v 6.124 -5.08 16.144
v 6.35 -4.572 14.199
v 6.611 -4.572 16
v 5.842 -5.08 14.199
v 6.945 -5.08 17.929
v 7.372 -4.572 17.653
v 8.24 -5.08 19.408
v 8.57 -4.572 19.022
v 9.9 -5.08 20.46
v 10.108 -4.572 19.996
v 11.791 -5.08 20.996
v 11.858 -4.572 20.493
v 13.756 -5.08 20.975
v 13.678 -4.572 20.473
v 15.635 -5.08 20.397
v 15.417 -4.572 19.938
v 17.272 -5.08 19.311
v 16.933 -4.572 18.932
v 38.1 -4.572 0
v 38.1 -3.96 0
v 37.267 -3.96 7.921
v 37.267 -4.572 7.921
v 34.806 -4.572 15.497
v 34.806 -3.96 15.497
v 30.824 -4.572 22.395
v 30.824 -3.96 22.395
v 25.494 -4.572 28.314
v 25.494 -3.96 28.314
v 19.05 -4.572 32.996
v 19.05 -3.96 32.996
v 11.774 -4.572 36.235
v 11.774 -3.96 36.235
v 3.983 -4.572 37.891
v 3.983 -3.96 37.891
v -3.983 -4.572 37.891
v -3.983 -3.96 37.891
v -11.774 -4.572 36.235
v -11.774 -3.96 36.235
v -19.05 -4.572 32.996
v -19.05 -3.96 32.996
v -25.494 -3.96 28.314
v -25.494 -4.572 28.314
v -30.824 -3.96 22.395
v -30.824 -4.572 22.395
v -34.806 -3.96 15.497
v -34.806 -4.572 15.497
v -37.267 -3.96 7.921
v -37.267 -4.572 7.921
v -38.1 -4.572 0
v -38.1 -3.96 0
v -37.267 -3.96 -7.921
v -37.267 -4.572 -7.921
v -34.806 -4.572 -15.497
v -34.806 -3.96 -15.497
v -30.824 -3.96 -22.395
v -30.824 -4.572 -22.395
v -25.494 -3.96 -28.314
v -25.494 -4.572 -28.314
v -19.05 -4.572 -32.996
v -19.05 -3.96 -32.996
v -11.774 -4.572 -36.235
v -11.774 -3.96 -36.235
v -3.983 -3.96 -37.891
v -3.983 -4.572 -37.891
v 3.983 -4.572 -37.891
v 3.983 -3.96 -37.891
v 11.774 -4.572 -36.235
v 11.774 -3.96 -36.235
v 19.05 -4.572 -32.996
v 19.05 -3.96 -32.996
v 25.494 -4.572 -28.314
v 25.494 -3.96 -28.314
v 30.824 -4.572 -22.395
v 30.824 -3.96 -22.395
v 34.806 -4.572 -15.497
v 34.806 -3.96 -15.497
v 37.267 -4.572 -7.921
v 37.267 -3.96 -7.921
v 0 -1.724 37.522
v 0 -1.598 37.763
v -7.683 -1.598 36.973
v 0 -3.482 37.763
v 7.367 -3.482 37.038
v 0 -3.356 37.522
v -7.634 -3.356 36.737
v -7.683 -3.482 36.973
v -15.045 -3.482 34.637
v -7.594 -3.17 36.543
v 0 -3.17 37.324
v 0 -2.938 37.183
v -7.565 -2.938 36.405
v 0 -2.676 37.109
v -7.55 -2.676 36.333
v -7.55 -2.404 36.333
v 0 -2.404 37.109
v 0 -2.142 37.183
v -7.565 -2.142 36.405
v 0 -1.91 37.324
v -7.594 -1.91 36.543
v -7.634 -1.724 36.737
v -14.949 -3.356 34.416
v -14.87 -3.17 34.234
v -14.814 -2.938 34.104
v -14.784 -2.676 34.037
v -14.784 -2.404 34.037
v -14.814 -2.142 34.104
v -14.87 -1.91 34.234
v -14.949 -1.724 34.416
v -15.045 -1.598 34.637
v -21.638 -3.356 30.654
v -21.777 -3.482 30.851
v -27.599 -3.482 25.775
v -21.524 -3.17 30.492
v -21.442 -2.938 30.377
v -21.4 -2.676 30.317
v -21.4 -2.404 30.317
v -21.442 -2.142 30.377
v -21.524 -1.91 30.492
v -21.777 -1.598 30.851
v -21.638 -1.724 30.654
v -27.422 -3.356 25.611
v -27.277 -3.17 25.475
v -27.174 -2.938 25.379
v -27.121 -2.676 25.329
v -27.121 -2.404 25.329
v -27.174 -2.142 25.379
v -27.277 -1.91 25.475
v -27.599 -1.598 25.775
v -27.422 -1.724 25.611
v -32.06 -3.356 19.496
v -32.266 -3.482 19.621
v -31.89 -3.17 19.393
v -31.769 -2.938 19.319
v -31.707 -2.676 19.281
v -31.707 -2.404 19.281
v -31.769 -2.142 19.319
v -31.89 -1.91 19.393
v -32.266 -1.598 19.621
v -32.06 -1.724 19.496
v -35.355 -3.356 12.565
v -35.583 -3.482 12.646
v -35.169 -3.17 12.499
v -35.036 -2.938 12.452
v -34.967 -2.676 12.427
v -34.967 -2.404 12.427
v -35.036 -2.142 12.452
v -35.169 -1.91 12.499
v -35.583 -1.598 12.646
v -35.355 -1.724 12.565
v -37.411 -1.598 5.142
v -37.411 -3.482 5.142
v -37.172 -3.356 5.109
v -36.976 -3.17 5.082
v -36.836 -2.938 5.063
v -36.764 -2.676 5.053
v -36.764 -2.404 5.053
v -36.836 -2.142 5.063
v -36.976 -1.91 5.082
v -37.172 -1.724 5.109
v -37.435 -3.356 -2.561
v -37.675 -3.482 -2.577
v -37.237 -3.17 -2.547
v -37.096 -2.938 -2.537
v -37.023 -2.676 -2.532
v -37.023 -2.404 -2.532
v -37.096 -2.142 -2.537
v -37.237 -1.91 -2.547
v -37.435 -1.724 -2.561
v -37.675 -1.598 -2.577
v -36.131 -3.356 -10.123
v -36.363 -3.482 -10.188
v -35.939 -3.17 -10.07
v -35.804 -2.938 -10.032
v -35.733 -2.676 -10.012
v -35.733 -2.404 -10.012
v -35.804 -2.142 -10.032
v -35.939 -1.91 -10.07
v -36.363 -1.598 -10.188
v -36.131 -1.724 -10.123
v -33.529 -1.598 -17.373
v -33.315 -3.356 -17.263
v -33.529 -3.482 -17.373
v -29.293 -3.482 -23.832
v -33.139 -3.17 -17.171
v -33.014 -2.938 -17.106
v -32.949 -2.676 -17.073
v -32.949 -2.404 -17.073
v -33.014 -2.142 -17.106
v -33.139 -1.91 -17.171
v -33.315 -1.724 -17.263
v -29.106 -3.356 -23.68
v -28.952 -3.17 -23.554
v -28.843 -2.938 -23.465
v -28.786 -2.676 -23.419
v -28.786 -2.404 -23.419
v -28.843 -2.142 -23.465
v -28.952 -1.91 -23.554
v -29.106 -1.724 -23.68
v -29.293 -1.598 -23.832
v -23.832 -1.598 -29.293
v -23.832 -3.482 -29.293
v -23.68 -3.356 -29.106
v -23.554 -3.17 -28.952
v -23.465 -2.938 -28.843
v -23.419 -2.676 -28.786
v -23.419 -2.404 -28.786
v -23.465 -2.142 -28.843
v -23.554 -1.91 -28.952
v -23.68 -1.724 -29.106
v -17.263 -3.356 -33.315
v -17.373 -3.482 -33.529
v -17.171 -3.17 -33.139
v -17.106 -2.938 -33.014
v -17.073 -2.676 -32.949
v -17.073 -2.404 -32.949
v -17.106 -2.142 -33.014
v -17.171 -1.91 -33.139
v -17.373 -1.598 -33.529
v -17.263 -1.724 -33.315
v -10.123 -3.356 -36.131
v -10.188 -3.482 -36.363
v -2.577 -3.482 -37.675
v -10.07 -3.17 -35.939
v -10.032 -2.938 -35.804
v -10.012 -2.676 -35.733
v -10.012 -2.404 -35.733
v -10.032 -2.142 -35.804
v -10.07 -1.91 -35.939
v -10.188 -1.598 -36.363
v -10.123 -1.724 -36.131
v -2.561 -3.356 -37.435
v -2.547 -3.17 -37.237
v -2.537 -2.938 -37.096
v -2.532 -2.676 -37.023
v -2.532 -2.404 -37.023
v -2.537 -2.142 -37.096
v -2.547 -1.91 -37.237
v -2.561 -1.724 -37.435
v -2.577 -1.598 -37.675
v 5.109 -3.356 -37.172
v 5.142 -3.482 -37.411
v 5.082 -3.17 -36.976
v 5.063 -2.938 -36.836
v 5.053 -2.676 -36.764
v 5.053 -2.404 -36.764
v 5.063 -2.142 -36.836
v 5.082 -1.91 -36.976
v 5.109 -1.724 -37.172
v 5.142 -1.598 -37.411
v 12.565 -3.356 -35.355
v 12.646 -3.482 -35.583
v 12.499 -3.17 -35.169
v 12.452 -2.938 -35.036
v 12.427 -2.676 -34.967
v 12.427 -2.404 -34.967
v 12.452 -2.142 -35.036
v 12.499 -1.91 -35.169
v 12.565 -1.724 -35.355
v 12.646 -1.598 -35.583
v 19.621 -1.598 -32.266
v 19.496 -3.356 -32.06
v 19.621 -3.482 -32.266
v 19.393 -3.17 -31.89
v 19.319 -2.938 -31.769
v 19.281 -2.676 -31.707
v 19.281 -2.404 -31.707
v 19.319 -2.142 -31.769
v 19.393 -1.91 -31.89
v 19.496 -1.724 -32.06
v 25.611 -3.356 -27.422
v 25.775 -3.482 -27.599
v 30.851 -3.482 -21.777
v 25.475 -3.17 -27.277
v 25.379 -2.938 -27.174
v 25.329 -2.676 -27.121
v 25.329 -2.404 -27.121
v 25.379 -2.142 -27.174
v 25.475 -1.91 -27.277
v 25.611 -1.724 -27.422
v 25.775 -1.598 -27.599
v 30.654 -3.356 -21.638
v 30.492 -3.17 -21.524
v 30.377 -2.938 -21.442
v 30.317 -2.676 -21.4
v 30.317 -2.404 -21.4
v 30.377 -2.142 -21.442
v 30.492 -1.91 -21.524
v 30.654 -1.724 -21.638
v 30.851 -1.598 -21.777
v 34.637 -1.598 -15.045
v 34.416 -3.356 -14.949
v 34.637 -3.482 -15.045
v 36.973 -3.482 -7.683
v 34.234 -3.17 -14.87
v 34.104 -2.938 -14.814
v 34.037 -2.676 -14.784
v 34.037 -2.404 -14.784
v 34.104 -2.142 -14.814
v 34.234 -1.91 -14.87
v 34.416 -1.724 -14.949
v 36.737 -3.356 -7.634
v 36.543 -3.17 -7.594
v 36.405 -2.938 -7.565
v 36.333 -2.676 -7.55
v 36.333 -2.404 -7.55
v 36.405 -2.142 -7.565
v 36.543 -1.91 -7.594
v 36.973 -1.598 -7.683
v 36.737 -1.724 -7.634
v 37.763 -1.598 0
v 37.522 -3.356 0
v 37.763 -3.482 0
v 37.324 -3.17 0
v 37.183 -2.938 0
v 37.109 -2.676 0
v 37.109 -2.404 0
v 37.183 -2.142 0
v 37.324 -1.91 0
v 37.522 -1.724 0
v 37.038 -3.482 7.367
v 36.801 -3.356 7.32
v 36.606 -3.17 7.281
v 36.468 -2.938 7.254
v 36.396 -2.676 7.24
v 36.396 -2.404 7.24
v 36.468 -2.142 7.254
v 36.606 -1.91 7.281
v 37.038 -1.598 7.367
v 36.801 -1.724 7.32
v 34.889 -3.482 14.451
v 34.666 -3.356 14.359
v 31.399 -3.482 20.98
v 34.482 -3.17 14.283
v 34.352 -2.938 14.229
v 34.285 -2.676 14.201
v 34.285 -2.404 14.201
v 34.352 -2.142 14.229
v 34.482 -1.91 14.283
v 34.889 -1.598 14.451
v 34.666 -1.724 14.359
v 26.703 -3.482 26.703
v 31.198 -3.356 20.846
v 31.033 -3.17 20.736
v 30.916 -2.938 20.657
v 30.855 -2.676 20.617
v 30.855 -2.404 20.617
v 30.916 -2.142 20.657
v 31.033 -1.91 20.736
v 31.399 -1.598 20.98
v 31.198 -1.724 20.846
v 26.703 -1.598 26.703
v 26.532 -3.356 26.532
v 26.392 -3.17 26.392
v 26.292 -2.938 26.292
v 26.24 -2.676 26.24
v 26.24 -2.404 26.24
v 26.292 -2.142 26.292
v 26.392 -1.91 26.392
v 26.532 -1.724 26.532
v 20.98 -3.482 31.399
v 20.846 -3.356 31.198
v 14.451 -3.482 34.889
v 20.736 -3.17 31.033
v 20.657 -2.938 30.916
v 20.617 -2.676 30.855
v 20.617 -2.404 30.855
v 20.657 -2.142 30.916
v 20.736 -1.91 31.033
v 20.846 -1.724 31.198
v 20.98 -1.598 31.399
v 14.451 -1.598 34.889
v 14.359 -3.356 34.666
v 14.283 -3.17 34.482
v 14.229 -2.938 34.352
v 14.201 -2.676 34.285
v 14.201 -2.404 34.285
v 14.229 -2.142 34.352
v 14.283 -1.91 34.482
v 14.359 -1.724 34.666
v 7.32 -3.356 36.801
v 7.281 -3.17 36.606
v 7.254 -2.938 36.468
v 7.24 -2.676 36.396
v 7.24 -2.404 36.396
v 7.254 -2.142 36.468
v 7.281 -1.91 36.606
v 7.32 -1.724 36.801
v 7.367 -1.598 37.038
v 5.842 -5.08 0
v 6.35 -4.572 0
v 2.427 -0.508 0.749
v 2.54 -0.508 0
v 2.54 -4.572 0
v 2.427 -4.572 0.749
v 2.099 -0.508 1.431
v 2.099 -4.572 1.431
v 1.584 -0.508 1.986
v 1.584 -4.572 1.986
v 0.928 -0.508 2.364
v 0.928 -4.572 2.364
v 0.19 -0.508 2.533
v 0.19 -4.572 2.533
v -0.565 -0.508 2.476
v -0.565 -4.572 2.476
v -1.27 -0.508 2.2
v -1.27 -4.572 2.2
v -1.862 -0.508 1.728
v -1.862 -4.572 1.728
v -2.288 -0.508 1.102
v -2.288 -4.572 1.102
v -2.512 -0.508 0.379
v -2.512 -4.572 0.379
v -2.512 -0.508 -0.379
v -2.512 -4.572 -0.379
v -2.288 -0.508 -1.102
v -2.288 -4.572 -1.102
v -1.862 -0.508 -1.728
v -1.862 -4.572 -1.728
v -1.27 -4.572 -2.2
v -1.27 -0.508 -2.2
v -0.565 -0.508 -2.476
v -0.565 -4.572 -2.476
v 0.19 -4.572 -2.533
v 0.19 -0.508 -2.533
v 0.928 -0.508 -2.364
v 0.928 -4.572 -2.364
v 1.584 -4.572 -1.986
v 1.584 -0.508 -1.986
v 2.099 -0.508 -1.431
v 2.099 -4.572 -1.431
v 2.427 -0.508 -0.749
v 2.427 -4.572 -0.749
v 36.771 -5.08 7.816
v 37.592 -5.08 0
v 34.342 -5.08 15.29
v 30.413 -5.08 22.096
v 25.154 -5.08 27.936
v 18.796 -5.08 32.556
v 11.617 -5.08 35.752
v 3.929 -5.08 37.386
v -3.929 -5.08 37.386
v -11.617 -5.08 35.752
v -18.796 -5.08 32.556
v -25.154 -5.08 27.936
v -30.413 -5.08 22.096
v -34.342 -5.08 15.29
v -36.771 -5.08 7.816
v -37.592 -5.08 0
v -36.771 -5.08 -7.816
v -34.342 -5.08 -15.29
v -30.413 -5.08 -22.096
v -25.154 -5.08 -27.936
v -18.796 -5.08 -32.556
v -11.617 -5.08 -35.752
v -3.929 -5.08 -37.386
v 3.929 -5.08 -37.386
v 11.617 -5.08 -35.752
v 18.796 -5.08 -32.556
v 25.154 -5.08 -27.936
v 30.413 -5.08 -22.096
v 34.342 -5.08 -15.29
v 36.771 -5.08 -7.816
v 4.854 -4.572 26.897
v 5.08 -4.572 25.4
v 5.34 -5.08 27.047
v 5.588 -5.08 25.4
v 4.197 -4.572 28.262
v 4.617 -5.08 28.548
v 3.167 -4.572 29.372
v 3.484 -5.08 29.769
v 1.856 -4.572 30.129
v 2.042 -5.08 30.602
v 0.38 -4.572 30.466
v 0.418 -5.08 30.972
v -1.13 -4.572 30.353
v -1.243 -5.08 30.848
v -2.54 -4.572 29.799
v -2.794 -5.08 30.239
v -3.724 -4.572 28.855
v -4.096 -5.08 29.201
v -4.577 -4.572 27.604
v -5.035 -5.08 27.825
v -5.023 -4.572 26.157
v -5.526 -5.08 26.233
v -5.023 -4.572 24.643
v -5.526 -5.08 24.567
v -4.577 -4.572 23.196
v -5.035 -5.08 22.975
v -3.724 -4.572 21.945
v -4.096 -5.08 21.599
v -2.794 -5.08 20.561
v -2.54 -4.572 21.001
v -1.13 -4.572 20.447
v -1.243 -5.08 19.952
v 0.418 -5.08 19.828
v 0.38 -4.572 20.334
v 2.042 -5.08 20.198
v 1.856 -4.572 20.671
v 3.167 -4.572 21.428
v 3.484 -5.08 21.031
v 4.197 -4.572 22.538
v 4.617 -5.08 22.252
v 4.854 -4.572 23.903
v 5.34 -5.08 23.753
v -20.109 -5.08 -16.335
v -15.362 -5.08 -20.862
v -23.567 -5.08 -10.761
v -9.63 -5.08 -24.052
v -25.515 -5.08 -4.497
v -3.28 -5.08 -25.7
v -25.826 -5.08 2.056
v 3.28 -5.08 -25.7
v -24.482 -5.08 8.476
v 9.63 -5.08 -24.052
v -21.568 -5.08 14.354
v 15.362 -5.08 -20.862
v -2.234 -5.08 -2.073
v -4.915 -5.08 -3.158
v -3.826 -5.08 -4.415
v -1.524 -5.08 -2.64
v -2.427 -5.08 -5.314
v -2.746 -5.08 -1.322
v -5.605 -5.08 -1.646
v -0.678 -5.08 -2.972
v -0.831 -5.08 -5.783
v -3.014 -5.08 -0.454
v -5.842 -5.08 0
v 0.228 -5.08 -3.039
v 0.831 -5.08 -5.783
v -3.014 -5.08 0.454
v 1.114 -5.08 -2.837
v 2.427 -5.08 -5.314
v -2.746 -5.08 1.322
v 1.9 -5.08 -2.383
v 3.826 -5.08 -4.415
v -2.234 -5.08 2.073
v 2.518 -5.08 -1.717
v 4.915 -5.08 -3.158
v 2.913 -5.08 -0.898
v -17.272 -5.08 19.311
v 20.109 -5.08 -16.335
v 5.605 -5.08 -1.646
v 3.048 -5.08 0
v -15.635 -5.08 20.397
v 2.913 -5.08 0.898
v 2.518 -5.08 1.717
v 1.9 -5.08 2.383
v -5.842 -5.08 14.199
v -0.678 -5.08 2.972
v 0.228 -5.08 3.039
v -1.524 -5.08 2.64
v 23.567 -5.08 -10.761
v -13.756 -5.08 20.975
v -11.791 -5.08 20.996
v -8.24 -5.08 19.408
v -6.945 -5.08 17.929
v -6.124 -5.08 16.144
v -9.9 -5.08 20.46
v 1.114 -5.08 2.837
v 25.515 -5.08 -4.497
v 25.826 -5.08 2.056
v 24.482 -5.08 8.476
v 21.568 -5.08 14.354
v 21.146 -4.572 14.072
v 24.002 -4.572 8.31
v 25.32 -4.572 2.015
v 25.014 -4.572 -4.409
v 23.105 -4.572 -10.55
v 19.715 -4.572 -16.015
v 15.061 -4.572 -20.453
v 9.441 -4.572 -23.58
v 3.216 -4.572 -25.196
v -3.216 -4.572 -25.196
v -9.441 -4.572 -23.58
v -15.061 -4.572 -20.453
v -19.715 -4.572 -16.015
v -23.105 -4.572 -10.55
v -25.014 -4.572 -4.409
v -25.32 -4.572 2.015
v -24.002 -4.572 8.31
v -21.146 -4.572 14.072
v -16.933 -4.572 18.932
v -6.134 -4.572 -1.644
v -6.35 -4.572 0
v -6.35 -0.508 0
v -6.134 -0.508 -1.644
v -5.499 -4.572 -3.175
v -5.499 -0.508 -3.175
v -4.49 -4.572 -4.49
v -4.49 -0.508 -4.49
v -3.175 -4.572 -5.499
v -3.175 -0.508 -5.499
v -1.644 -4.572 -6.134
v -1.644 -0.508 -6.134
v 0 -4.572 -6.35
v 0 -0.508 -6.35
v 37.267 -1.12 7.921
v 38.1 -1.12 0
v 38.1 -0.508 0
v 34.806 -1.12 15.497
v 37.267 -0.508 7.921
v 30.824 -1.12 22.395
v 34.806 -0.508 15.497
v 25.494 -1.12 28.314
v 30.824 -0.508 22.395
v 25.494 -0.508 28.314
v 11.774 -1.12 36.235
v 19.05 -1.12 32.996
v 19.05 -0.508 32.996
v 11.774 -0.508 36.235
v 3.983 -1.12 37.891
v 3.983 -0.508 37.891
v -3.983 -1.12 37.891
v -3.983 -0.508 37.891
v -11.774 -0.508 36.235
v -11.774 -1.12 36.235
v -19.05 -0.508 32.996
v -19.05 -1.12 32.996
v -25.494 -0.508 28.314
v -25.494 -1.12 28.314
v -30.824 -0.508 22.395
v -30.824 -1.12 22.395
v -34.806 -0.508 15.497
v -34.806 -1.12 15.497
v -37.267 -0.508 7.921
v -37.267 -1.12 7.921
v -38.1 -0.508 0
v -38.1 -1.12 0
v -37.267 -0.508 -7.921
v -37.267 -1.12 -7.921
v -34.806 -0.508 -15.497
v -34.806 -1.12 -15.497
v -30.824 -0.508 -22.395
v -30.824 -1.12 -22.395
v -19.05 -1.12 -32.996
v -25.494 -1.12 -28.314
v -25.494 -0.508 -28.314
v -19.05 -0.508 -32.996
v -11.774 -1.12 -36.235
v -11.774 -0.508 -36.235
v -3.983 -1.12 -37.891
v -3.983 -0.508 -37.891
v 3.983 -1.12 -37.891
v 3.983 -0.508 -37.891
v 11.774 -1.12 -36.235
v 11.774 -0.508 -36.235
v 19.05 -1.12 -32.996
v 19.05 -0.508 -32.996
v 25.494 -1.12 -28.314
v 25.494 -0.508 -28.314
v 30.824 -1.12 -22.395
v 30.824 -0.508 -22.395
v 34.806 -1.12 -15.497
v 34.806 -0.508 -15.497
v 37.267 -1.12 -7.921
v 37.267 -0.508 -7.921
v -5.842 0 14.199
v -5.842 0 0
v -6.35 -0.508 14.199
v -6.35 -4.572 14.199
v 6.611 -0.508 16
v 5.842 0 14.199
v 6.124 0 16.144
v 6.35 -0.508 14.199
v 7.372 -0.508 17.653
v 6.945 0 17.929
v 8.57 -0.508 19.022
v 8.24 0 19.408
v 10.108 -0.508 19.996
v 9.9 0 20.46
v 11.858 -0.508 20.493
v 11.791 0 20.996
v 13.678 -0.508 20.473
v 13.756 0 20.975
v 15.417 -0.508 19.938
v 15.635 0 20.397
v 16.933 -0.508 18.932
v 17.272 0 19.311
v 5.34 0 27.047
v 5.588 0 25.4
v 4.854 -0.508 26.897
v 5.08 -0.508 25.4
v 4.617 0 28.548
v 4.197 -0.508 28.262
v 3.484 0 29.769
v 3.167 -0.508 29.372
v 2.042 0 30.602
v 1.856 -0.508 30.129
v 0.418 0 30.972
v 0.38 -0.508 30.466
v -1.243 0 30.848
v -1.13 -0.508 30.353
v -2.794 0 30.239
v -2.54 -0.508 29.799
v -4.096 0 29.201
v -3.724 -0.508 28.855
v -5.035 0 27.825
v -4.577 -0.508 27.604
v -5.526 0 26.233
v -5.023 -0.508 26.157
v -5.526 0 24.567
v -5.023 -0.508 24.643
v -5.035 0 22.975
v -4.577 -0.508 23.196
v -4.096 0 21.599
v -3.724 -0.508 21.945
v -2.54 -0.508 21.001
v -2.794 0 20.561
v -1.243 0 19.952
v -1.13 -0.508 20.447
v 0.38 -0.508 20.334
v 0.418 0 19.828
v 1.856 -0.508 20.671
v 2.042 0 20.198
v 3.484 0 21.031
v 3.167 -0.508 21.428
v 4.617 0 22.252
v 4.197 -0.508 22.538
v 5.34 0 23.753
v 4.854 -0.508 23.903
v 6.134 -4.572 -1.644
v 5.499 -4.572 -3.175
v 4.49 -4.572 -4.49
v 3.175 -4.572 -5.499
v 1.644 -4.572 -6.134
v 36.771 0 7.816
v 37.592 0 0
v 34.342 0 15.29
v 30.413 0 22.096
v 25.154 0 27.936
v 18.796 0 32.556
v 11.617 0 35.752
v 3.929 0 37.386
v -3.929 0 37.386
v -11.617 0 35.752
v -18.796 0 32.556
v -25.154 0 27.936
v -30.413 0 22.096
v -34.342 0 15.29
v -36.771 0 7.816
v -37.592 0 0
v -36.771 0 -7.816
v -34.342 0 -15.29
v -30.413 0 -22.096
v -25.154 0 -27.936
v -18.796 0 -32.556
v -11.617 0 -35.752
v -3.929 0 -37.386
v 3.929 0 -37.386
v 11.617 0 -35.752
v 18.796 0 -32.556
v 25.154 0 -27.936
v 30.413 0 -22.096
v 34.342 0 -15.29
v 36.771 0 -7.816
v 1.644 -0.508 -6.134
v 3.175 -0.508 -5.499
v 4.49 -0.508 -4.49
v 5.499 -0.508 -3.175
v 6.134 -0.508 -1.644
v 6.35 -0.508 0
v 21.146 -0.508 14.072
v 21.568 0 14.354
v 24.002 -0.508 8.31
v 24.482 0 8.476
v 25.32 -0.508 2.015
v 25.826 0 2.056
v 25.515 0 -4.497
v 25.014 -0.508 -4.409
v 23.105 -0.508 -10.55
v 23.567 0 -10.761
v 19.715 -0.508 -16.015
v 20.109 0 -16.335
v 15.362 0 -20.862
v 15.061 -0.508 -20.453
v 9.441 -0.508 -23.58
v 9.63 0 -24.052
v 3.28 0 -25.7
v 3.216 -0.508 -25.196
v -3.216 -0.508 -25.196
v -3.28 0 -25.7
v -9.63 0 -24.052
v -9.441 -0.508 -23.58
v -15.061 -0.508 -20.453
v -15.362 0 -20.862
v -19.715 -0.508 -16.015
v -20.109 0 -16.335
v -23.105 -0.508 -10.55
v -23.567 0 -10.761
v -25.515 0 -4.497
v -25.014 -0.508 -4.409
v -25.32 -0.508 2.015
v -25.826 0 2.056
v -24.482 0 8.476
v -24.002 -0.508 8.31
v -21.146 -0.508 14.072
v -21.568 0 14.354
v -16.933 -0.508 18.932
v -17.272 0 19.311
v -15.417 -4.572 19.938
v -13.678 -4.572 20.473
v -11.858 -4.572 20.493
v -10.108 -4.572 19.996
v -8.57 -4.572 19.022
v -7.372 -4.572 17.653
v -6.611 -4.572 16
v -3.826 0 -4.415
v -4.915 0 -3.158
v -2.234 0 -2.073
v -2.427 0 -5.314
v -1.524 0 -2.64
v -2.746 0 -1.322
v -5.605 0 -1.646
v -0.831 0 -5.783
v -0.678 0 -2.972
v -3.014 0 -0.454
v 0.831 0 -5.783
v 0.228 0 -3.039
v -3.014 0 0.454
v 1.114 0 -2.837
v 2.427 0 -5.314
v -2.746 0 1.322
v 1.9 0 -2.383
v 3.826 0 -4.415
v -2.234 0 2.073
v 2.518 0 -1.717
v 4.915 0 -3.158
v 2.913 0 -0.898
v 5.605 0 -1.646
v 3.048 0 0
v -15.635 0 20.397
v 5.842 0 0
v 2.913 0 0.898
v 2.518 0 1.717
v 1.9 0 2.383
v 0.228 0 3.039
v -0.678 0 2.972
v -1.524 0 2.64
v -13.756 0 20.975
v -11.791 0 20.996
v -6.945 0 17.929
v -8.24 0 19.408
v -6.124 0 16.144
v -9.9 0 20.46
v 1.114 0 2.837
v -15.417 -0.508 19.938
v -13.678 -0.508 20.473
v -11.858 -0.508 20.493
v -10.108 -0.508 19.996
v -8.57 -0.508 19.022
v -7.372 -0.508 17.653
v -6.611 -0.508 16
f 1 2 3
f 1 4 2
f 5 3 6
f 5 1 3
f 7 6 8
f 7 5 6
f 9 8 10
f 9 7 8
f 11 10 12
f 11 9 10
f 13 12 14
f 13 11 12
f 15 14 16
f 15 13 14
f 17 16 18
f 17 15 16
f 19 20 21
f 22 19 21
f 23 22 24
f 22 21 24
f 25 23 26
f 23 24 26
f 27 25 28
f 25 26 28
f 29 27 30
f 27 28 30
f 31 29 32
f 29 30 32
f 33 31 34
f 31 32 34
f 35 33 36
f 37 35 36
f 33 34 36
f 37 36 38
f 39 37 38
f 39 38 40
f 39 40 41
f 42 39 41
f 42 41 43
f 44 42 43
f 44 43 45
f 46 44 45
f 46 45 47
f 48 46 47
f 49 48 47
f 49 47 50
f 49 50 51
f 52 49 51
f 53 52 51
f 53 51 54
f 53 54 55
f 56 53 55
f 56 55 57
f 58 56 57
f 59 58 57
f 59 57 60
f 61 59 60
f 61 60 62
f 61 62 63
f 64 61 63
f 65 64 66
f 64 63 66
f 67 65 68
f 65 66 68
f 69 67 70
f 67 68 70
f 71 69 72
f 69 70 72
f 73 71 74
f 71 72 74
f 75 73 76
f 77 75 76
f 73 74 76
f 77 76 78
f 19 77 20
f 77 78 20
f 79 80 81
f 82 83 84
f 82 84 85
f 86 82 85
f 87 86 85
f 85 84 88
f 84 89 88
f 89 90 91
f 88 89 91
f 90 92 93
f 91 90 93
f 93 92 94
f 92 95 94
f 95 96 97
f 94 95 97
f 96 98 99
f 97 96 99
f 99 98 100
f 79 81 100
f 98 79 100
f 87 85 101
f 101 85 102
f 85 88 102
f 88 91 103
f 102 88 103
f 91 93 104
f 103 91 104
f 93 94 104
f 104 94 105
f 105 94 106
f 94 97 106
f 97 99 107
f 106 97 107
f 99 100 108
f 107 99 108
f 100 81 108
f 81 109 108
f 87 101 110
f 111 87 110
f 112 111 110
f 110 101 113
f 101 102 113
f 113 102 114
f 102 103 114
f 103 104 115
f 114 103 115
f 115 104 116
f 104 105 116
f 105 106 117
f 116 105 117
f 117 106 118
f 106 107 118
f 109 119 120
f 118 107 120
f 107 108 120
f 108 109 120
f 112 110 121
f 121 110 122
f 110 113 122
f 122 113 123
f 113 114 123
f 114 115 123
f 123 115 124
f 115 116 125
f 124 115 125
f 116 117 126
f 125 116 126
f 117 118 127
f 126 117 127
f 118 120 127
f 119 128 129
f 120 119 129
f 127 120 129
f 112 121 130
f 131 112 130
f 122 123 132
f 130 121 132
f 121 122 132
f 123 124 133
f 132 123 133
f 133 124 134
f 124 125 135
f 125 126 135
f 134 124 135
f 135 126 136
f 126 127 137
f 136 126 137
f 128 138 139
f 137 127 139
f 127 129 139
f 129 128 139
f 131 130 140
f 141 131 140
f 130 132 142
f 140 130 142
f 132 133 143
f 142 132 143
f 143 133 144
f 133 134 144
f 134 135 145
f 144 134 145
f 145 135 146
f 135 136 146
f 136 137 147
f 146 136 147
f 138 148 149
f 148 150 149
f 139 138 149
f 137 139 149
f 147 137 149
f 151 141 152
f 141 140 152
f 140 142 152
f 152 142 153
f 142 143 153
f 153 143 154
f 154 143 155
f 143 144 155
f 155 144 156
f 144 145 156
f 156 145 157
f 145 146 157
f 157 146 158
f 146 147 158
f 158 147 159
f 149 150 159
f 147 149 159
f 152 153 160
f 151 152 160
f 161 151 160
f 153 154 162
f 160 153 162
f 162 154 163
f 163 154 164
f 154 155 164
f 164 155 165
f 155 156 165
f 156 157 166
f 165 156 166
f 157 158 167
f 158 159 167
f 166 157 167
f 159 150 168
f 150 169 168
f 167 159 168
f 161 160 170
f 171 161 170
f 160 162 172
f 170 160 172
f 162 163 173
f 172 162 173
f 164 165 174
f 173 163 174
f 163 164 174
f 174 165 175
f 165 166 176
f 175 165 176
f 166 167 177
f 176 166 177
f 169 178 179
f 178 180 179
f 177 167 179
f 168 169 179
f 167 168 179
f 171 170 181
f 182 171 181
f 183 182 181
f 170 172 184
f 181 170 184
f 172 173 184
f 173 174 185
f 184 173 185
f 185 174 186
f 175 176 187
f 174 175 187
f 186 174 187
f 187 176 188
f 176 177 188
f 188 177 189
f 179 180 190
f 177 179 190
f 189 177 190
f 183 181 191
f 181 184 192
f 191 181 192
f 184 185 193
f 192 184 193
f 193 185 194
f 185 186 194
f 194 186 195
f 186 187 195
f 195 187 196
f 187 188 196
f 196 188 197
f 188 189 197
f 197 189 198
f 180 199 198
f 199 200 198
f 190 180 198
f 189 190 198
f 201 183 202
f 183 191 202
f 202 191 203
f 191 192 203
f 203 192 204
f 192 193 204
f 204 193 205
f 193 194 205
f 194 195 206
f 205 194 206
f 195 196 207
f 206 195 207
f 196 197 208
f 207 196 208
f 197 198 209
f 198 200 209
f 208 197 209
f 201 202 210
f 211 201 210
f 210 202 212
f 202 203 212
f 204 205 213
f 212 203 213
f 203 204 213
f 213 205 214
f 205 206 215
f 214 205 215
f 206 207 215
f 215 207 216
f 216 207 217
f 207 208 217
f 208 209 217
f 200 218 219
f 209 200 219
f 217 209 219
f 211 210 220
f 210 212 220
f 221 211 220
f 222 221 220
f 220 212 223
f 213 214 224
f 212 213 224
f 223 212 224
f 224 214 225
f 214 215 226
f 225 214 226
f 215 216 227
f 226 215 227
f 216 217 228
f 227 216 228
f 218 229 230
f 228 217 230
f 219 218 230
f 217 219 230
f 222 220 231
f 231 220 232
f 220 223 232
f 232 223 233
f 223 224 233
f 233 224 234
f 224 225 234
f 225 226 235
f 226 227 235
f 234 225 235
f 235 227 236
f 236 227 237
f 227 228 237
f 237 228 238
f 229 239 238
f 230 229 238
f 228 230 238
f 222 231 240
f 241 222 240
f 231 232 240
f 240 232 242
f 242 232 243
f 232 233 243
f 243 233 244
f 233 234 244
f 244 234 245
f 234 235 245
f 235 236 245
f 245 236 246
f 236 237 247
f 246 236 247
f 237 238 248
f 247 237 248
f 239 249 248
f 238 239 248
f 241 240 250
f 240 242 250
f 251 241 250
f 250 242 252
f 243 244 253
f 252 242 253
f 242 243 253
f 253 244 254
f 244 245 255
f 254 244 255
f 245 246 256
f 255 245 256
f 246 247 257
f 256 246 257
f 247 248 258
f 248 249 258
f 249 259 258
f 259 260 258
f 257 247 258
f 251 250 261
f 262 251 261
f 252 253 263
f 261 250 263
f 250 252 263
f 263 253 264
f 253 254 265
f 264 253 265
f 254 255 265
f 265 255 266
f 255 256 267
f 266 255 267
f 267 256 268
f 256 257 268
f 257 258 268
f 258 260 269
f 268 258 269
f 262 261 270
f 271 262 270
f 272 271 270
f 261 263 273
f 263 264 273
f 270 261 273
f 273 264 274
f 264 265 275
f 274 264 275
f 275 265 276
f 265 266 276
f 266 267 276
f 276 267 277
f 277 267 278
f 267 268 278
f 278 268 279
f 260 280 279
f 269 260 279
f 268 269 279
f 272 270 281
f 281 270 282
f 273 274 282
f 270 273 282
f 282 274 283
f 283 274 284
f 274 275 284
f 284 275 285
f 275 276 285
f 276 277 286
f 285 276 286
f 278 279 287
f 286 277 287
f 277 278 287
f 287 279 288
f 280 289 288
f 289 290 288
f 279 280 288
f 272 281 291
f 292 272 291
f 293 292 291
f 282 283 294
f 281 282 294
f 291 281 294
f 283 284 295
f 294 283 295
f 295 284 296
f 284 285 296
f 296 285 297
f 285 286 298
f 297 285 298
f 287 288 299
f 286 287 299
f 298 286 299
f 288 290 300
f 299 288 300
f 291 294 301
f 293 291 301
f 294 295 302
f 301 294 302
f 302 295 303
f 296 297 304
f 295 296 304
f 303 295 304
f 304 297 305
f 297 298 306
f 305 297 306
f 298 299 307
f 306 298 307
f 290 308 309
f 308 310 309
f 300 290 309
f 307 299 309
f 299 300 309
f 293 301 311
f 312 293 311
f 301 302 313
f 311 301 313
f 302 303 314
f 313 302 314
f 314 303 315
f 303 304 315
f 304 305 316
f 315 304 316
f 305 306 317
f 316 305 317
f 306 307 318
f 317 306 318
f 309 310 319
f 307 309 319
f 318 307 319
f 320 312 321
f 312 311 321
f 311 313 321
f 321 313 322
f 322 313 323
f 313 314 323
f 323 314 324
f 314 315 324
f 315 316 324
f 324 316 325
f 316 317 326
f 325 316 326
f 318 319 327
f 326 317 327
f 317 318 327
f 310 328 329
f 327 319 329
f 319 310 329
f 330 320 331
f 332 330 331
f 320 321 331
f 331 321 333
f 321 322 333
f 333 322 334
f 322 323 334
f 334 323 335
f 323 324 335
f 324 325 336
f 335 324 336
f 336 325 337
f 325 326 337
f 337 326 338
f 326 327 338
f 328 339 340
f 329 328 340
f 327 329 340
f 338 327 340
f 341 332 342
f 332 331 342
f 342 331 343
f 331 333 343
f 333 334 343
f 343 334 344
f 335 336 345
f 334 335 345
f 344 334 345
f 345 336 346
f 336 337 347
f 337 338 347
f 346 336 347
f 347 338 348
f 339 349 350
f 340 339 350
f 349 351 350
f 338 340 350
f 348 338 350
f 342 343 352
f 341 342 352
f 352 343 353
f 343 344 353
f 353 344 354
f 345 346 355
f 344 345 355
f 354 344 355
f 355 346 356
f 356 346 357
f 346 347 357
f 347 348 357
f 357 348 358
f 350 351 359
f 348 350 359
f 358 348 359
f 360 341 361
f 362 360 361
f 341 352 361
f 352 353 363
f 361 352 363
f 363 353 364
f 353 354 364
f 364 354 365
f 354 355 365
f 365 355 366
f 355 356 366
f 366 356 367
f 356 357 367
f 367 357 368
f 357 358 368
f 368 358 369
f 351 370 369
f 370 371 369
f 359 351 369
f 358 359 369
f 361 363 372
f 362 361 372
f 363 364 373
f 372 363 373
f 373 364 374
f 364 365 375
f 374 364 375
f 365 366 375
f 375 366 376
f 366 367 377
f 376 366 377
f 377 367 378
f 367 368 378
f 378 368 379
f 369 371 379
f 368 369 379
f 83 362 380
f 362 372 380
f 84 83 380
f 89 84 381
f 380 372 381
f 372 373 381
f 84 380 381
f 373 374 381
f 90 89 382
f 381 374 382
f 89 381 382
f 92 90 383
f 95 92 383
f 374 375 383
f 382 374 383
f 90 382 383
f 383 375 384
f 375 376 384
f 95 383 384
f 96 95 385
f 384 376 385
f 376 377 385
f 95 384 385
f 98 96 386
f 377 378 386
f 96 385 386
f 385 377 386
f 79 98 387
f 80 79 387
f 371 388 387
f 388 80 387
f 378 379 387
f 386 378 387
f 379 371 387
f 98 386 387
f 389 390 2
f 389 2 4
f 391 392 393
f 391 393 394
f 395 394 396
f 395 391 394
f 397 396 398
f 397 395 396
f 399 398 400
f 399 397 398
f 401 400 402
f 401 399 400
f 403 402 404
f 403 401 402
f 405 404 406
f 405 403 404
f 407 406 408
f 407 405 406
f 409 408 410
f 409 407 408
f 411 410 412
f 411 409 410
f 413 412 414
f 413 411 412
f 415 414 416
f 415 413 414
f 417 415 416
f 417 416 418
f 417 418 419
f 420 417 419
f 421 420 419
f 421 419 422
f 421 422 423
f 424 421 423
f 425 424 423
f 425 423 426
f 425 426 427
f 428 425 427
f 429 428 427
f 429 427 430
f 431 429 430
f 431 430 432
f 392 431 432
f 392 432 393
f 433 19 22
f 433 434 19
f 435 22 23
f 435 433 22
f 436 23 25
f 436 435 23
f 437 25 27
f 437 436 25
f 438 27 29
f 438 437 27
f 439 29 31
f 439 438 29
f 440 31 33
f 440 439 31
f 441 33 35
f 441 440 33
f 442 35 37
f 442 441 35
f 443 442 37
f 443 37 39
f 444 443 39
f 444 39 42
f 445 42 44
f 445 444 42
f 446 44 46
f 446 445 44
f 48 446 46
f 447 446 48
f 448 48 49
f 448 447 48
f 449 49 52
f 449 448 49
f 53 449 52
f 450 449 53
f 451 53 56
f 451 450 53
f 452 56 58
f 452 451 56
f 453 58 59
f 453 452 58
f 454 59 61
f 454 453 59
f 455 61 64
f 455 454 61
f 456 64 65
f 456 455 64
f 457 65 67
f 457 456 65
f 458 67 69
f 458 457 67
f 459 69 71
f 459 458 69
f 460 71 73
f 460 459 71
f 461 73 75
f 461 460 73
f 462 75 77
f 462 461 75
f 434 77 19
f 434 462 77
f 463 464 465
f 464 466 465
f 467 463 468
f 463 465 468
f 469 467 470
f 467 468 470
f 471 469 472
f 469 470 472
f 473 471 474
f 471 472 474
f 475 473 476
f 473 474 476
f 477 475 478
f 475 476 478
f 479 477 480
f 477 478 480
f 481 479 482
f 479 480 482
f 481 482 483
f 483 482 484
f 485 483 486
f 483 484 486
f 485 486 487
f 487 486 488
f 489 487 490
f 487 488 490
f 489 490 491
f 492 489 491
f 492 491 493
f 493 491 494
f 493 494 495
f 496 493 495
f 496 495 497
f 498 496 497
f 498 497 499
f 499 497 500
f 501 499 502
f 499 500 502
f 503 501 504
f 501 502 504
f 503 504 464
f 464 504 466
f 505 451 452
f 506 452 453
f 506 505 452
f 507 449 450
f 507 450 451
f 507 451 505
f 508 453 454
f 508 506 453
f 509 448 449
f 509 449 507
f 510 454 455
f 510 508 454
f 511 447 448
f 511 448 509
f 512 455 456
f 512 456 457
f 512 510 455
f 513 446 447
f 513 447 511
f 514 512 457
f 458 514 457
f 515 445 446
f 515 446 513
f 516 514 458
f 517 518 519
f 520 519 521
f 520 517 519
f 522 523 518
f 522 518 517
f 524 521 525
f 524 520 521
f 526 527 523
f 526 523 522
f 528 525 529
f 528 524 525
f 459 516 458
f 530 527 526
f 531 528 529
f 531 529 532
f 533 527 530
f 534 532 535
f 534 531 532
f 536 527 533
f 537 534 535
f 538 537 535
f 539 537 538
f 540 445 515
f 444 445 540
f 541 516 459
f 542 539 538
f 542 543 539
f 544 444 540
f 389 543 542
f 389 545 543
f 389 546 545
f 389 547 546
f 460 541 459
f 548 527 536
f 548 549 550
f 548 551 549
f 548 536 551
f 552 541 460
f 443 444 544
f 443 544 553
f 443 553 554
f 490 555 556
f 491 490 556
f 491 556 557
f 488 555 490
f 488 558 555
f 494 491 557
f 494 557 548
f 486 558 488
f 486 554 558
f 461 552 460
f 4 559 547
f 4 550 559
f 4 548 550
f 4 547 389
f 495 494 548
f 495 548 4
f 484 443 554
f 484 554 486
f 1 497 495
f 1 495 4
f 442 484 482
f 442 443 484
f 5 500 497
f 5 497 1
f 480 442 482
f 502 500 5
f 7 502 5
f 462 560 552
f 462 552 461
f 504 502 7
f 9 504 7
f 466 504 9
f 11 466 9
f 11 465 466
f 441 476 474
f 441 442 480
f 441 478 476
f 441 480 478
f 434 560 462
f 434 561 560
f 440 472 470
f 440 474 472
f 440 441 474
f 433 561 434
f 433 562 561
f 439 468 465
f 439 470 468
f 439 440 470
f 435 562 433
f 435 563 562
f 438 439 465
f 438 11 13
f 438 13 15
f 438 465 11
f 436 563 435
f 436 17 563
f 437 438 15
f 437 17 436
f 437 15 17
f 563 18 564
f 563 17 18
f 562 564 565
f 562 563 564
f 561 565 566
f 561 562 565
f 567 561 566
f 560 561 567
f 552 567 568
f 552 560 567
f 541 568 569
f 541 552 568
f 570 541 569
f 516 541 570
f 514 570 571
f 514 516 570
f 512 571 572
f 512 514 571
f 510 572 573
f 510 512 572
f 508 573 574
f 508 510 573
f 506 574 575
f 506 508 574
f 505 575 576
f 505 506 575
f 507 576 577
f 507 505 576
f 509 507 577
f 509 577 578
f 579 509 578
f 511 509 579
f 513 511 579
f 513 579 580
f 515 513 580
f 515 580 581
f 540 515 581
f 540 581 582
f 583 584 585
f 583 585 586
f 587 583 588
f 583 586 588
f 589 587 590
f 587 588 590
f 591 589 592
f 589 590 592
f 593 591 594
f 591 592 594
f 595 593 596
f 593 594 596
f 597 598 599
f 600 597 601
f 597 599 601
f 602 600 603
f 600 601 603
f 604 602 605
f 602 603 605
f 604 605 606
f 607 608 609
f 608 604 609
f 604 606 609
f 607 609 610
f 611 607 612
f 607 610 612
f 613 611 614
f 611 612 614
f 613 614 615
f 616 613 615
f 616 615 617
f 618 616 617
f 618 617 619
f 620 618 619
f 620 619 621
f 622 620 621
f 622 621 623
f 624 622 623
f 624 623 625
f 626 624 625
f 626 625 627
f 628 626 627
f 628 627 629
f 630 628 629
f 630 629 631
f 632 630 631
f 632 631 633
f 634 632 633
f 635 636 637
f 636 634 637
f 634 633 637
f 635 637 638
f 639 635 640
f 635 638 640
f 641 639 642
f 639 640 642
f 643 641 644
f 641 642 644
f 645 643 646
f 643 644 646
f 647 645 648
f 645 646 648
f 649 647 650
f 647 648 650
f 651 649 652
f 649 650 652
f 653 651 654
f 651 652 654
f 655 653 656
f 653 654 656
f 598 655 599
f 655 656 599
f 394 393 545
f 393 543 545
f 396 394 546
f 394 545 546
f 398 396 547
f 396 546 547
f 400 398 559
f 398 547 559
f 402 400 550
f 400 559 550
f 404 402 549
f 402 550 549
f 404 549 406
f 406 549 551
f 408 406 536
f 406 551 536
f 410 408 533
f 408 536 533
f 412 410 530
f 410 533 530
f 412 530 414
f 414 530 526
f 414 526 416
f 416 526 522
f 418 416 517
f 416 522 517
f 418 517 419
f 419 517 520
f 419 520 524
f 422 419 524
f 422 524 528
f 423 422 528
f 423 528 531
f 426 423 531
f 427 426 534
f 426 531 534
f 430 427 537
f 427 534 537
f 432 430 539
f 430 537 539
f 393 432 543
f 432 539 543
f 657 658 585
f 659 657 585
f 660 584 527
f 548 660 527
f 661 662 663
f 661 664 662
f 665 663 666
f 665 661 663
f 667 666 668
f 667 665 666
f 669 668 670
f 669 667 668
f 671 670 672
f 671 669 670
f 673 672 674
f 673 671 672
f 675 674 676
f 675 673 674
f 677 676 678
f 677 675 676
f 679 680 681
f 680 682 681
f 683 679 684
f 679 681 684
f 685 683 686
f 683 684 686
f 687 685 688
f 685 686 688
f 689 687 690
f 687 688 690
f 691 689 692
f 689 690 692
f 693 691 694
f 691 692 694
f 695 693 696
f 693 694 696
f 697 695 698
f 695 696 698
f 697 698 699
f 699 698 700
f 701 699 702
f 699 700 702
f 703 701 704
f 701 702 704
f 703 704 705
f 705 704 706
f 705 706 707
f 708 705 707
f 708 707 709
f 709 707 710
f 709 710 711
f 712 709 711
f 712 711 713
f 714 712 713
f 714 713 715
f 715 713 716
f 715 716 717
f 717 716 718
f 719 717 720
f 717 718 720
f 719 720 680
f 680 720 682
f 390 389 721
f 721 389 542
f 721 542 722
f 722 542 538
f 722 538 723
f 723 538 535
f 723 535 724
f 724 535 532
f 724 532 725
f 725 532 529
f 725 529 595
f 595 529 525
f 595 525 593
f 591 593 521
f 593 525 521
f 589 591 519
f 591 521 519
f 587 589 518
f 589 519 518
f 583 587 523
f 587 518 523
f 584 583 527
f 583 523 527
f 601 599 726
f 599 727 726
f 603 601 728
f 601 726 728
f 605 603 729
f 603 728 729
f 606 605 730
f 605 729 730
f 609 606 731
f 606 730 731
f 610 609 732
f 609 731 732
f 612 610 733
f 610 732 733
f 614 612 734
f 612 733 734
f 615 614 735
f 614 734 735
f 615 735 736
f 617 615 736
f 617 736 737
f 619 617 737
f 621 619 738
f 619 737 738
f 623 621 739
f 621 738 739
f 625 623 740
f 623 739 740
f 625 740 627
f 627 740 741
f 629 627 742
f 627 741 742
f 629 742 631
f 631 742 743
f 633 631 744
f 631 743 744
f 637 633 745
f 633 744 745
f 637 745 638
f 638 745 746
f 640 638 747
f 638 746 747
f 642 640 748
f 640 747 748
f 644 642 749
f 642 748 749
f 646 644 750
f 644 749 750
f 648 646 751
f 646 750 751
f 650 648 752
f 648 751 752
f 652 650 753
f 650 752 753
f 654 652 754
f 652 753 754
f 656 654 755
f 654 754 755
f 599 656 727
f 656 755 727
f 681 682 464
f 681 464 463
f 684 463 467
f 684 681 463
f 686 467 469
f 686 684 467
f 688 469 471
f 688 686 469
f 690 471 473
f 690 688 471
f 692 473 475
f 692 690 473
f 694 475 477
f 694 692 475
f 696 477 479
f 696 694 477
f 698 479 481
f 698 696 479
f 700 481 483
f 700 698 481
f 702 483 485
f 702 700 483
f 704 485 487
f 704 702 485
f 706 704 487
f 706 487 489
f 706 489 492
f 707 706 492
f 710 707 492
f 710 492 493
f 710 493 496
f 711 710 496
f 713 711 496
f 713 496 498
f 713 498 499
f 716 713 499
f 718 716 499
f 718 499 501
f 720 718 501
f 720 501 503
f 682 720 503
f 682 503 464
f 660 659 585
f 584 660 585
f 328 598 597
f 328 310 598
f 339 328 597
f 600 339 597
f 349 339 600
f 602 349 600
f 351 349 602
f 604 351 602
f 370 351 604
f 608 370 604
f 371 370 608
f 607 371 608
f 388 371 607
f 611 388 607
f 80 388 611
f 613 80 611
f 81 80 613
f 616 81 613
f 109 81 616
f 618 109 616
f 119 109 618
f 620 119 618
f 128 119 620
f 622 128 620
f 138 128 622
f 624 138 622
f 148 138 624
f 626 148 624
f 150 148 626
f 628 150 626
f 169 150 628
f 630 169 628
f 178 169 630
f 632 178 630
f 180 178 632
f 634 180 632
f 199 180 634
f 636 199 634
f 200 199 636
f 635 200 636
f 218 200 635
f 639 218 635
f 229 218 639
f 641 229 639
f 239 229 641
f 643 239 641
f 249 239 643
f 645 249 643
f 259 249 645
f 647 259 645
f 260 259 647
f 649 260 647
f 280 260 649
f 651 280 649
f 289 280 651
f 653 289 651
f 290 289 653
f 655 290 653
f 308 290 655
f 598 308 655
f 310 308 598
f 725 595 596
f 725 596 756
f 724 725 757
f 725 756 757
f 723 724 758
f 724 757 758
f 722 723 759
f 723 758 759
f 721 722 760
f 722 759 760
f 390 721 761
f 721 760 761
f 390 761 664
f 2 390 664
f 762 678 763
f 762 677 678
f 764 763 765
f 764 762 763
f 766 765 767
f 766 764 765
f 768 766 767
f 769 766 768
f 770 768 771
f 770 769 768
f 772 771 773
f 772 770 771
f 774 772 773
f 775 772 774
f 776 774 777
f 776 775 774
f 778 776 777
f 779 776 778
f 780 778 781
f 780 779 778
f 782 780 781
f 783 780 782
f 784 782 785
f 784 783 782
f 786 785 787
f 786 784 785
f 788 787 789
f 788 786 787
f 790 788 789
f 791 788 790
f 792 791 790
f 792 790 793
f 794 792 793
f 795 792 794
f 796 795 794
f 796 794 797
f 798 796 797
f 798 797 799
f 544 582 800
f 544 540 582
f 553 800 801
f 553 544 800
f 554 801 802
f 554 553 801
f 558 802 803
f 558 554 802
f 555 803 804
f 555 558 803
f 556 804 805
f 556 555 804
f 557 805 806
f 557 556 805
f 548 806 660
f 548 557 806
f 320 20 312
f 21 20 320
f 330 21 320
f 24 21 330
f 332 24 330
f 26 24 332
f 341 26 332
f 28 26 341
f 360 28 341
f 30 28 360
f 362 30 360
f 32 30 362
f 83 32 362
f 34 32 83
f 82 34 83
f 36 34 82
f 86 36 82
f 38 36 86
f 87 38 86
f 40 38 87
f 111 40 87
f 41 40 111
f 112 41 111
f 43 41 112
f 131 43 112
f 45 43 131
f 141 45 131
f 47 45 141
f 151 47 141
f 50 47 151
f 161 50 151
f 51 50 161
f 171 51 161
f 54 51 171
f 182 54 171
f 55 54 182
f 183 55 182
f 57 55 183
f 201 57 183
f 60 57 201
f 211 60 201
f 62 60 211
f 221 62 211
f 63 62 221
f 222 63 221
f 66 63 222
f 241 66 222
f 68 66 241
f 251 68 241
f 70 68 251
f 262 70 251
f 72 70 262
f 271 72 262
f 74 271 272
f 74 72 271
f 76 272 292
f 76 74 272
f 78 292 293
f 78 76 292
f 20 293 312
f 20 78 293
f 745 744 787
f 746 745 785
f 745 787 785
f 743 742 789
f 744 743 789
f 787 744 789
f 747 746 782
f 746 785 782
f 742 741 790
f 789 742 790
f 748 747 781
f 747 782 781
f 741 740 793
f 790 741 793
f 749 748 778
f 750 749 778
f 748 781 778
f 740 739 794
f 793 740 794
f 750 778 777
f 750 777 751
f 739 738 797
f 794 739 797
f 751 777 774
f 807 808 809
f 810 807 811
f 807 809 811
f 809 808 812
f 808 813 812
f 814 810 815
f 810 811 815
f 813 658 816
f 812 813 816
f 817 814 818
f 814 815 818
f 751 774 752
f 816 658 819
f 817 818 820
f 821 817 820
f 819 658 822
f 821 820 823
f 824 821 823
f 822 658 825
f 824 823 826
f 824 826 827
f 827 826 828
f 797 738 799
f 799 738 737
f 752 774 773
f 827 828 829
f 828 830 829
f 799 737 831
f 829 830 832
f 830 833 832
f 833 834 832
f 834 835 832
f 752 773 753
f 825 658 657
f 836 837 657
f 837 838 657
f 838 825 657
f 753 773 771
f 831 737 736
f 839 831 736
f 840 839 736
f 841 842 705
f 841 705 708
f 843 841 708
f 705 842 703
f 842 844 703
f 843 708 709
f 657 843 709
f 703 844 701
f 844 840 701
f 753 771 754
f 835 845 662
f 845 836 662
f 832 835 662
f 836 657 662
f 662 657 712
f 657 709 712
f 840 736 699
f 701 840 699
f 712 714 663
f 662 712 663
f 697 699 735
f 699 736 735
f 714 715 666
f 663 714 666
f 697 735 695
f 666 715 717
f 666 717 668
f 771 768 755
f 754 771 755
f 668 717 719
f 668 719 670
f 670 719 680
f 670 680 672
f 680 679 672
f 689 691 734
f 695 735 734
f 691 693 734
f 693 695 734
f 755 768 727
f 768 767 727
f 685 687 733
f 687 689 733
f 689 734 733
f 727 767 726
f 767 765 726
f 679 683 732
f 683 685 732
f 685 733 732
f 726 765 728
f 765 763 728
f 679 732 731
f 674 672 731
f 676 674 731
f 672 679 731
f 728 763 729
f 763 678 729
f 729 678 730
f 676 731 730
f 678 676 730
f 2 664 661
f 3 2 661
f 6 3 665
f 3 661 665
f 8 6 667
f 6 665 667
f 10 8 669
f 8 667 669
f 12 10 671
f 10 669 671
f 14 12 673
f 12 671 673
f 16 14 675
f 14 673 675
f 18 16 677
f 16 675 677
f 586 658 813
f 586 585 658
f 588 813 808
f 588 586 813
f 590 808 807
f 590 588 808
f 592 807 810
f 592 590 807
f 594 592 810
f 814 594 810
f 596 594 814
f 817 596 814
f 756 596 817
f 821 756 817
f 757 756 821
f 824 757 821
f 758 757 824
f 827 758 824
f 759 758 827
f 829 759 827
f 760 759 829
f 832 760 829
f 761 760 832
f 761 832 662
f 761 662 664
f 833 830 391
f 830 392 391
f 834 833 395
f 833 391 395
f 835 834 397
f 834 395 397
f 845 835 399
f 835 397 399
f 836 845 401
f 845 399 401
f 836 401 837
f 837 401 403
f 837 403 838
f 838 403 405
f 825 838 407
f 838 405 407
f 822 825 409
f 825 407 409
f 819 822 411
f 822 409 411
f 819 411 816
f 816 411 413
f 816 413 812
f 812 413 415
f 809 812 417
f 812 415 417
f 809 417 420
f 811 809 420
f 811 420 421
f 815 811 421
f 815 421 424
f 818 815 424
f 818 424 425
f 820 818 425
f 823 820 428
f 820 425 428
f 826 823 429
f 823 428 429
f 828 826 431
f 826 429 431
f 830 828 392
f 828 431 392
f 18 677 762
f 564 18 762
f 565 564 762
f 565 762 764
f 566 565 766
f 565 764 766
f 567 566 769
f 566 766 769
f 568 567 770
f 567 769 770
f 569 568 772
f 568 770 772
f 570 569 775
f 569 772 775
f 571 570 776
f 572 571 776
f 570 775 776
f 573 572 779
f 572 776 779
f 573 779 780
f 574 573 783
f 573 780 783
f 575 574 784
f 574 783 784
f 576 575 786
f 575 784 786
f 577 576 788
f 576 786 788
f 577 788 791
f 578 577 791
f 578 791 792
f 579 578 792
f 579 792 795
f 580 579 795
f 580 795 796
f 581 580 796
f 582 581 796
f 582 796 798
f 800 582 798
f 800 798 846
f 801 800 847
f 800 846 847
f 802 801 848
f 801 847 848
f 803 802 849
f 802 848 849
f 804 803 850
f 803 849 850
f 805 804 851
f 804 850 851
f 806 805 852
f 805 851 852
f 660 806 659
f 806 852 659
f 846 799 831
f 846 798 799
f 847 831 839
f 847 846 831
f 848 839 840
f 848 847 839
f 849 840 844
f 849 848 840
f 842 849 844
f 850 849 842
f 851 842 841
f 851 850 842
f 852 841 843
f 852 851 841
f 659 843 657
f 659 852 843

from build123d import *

# Parameters (mm, degrees)
F0_R         = 38.1
F0_R_2       = 2.54
F0_R_3       = 5.08
F1_DEPTH     = 5.08
F5_T1_DEPTH  = 14.1990316571
F5_T6_ANGLE  = 276.3793702084
F5_T8_ANGLE  = 131.8103148958
F5_T10_ANGLE = 180
F5_T12_ANGLE = 131.8103148958
F5_T20_ANGLE = 276.3793702084
F5_T22_ANGLE = 131.8103148958
F5_T24_ANGLE = 180
F5_T26_ANGLE = 131.8103148958
F5_T32_ANGLE = 270
F5_T34_ANGLE = 90
F5_T36_ANGLE = 90
F5_T38_ANGLE = 270


# Not quite as in the source:
# - a fillet or chamfer that OpenCascade refuses, or shapes differently, is made with other operations: its cross-section is extruded or revolved along the edge and cut away or added


with BuildPart() as f1:
    # F0 (on Front) → F1 (new body)
    with BuildSketch(Plane.XZ):
        Circle(F0_R)
        with BuildLine():
            ThreePointArc((16.9333333333, 18.9320422095), (0, -25.4), (-16.9333333333, 18.9320422095))
            ThreePointArc((-16.9333333333, 18.9320422095), (-10.1076233556, 19.9957620574), (-6.35, 14.1990316571))
            Line((-6.35, 14.1990316571), (-6.35, 0))
            ThreePointArc((-6.35, 0), (-4.4901280605, -4.4901280605), (0, -6.35))
            ThreePointArc((0, -6.35), (4.4901280605, -4.4901280605), (6.35, 0))
            Line((6.35, 0), (6.35, 14.1990316571))
            ThreePointArc((6.35, 14.1990316571), (10.1076233556, 19.9957620574), (16.9333333333, 18.9320422095))
        make_face(mode=Mode.SUBTRACT)
        Circle(F0_R_2, mode=Mode.SUBTRACT)
        with Locations((0, 25.4)):
            Circle(F0_R_3, mode=Mode.SUBTRACT)
    extrude(amount=F1_DEPTH)


with BuildPart() as f3:
    # F2 (on Right) → F3 (revolve)
    with BuildSketch(Plane.YZ):
        with BuildLine():
            ThreePointArc((-3.54, 38.1), (-2.54, 37.1), (-1.54, 38.1))
            Line((-1.54, 38.1), (-3.54, 38.1))
        make_face()
        with BuildLine():
            Line((-3.54, 38.1), (-1.54, 38.1))
            ThreePointArc((-1.54, 38.1), (-2.54, 39.1), (-3.54, 38.1))
        make_face()
    revolve(axis=Axis((0, 0, 0), (0, -1, 0)))


with BuildPart() as f1_1:
    add(f1.part)

    # F4: cut F3
    add(f3.part, mode=Mode.SUBTRACT)

    # F5: chamfer of 0.508 on 22 edges, made by hand

    # F5_s2 → F5_t1 (cut)
    with BuildSketch(Plane.XY):
        Polygon((-6.35, -4.572), (-5.842, -5.08), (-6.35, -5.08), align=None)
        Polygon((6.35, -4.572), (5.842, -5.08), (6.35, -5.08), align=None)
        Polygon((-5.842, 0), (-6.35, -0.508), (-6.35, 0), align=None)
        Polygon((5.842, 0), (6.35, -0.508), (6.35, 0), align=None)
    extrude(amount=F5_T1_DEPTH, mode=Mode.SUBTRACT)

    # F5_s3 → F5_t4 (revolve, cut)
    with BuildSketch(Plane.XY):
        Polygon((38.1, -4.572), (37.592, -5.08), (38.1, -5.08), align=None)
    revolve(axis=Axis((0, -5.08, 0), (0, -1, 0)), mode=Mode.SUBTRACT)

    # F5_s5 → F5_t6 (revolve, cut)
    with BuildSketch(Plane(origin=(0, 0, 0), x_dir=(0, 1, 0), z_dir=(-0.7453559925, 0, 0.6666666667))):
        Polygon((-4.572, -25.4), (-5.08, -25.908), (-5.08, -25.4), align=None)
    revolve(axis=Axis((0, -5.08, 0), (0, 1, 0)), revolution_arc=F5_T6_ANGLE, mode=Mode.SUBTRACT)

    # F5_s7 → F5_t8 (revolve, cut)
    with BuildSketch(Plane(origin=(0, 0, 0), x_dir=(0, 1, 0), z_dir=(-0.7453559925, 0, -0.6666666667))):
        Polygon((-4.572, -25.4), (-5.08, -25.908), (-5.08, -25.4), align=None)
    revolve(axis=Axis((-12.7, -5.08, 14.1990316571), (0, 1, 0)), revolution_arc=F5_T8_ANGLE, mode=Mode.SUBTRACT)

    # F5_s9 → F5_t10 (revolve, cut)
    with BuildSketch(Plane.XY):
        Polygon((6.35, -4.572), (5.842, -5.08), (6.35, -5.08), align=None)
    revolve(axis=Axis((0, -5.08, 0), (0, 1, 0)), revolution_arc=F5_T10_ANGLE, mode=Mode.SUBTRACT)

    # F5_s11 → F5_t12 (revolve, cut)
    with BuildSketch(Plane.XY.offset(14.1990316571)):
        Polygon((6.35, -4.572), (5.842, -5.08), (6.35, -5.08), align=None)
    revolve(axis=Axis((12.7, -5.08, 14.1990316571), (0, 1, 0)), revolution_arc=F5_T12_ANGLE, mode=Mode.SUBTRACT)

    # F5_s13 → F5_t14 (revolve, cut)
    with BuildSketch(Plane.XY):
        Polygon((2.54, -4.572), (3.048, -5.08), (2.54, -5.08), align=None)
    revolve(axis=Axis((0, -5.08, 0), (0, -1, 0)), mode=Mode.SUBTRACT)

    # F5_s15 → F5_t16 (revolve, cut)
    with BuildSketch(Plane.XY.offset(25.4)):
        Polygon((5.08, -4.572), (5.588, -5.08), (5.08, -5.08), align=None)
    revolve(axis=Axis((0, -5.08, 25.4), (0, -1, 0)), mode=Mode.SUBTRACT)

    # F5_s17 → F5_t18 (revolve, cut)
    with BuildSketch(Plane.XY):
        Polygon((38.1, -0.508), (37.592, 0), (38.1, 0), align=None)
    revolve(axis=Axis((0, 0, 0), (0, -1, 0)), mode=Mode.SUBTRACT)

    # F5_s19 → F5_t20 (revolve, cut)
    with BuildSketch(Plane(origin=(0, 0, 0), x_dir=(0, 1, 0), z_dir=(-0.7453559925, 0, 0.6666666667))):
        Polygon((0, -25.908), (-0.508, -25.4), (0, -25.4), align=None)
    revolve(axis=Axis((0, 0, 0), (0, 1, 0)), revolution_arc=F5_T20_ANGLE, mode=Mode.SUBTRACT)

    # F5_s21 → F5_t22 (revolve, cut)
    with BuildSketch(Plane(origin=(0, 0, 0), x_dir=(0, 1, 0), z_dir=(-0.7453559925, 0, -0.6666666667))):
        Polygon((0, -25.908), (-0.508, -25.4), (0, -25.4), align=None)
    revolve(axis=Axis((-12.7, 0, 14.1990316571), (0, 1, 0)), revolution_arc=F5_T22_ANGLE, mode=Mode.SUBTRACT)

    # F5_s23 → F5_t24 (revolve, cut)
    with BuildSketch(Plane.XY):
        Polygon((-5.842, 0), (-6.35, -0.508), (-6.35, 0), align=None)
    revolve(axis=Axis((0, 0, 0), (0, -1, 0)), revolution_arc=F5_T24_ANGLE, mode=Mode.SUBTRACT)

    # F5_s25 → F5_t26 (revolve, cut)
    with BuildSketch(Plane.XY.offset(14.1990316571)):
        Polygon((5.842, 0), (6.35, -0.508), (6.35, 0), align=None)
    revolve(axis=Axis((12.7, 0, 14.1990316571), (0, 1, 0)), revolution_arc=F5_T26_ANGLE, mode=Mode.SUBTRACT)

    # F5_s27 → F5_t28 (revolve, cut)
    with BuildSketch(Plane.XY):
        Polygon((3.048, 0), (2.54, -0.508), (2.54, 0), align=None)
    revolve(axis=Axis((0, 0, 0), (0, -1, 0)), mode=Mode.SUBTRACT)

    # F5_s29 → F5_t30 (revolve, cut)
    with BuildSketch(Plane.XY.offset(25.4)):
        Polygon((5.588, 0), (5.08, -0.508), (5.08, 0), align=None)
    revolve(axis=Axis((0, 0, 25.4), (0, -1, 0)), mode=Mode.SUBTRACT)

    # F5_s31 → F5_t32 (revolve, cut)
    with BuildSketch(Plane.YZ):
        with BuildLine():
            Line((-1.1201408521, 38.1), (-1.5984488409, 37.7631299735))
            ThreePointArc((-1.5984488409, 37.7631299735), (-1.5560027564, 37.921816318), (-1.54, 38.1))
            Line((-1.54, 38.1), (-1.1201408521, 38.1))
        make_face()
    revolve(axis=Axis((0, -1.54, 0), (0, -1, 0)), revolution_arc=F5_T32_ANGLE, mode=Mode.SUBTRACT)

    # F5_s33 → F5_t34 (revolve, cut)
    with BuildSketch(Plane.XY):
        with BuildLine():
            Line((38.1, -1.1201408521), (37.7631299735, -1.5984488409))
            ThreePointArc((37.7631299735, -1.5984488409), (37.921816318, -1.5560027564), (38.1, -1.54))
            Line((38.1, -1.54), (38.1, -1.1201408521))
        make_face()
    revolve(axis=Axis((0, -1.54, 0), (0, -1, 0)), revolution_arc=F5_T34_ANGLE, mode=Mode.SUBTRACT)

    # F5_s35 → F5_t36 (revolve, cut)
    with BuildSketch(Plane.XY):
        with BuildLine():
            Line((37.7631299735, -3.4815511591), (38.1, -3.9598591479))
            Line((38.1, -3.9598591479), (38.1, -3.54))
            ThreePointArc((38.1, -3.54), (37.921816318, -3.5239972436), (37.7631299735, -3.4815511591))
        make_face()
    revolve(axis=Axis((0, -3.54, 0), (0, -1, 0)), revolution_arc=F5_T36_ANGLE, mode=Mode.SUBTRACT)

    # F5_s37 → F5_t38 (revolve, cut)
    with BuildSketch(Plane.YZ):
        with BuildLine():
            Line((-3.4815511591, 37.7631299735), (-3.9598591479, 38.1))
            Line((-3.9598591479, 38.1), (-3.54, 38.1))
            ThreePointArc((-3.54, 38.1), (-3.5239972436, 37.921816318), (-3.4815511591, 37.7631299735))
        make_face()
    revolve(axis=Axis((0, -3.54, 0), (0, -1, 0)), revolution_arc=F5_T38_ANGLE, mode=Mode.SUBTRACT)


solid = f1_1.part
